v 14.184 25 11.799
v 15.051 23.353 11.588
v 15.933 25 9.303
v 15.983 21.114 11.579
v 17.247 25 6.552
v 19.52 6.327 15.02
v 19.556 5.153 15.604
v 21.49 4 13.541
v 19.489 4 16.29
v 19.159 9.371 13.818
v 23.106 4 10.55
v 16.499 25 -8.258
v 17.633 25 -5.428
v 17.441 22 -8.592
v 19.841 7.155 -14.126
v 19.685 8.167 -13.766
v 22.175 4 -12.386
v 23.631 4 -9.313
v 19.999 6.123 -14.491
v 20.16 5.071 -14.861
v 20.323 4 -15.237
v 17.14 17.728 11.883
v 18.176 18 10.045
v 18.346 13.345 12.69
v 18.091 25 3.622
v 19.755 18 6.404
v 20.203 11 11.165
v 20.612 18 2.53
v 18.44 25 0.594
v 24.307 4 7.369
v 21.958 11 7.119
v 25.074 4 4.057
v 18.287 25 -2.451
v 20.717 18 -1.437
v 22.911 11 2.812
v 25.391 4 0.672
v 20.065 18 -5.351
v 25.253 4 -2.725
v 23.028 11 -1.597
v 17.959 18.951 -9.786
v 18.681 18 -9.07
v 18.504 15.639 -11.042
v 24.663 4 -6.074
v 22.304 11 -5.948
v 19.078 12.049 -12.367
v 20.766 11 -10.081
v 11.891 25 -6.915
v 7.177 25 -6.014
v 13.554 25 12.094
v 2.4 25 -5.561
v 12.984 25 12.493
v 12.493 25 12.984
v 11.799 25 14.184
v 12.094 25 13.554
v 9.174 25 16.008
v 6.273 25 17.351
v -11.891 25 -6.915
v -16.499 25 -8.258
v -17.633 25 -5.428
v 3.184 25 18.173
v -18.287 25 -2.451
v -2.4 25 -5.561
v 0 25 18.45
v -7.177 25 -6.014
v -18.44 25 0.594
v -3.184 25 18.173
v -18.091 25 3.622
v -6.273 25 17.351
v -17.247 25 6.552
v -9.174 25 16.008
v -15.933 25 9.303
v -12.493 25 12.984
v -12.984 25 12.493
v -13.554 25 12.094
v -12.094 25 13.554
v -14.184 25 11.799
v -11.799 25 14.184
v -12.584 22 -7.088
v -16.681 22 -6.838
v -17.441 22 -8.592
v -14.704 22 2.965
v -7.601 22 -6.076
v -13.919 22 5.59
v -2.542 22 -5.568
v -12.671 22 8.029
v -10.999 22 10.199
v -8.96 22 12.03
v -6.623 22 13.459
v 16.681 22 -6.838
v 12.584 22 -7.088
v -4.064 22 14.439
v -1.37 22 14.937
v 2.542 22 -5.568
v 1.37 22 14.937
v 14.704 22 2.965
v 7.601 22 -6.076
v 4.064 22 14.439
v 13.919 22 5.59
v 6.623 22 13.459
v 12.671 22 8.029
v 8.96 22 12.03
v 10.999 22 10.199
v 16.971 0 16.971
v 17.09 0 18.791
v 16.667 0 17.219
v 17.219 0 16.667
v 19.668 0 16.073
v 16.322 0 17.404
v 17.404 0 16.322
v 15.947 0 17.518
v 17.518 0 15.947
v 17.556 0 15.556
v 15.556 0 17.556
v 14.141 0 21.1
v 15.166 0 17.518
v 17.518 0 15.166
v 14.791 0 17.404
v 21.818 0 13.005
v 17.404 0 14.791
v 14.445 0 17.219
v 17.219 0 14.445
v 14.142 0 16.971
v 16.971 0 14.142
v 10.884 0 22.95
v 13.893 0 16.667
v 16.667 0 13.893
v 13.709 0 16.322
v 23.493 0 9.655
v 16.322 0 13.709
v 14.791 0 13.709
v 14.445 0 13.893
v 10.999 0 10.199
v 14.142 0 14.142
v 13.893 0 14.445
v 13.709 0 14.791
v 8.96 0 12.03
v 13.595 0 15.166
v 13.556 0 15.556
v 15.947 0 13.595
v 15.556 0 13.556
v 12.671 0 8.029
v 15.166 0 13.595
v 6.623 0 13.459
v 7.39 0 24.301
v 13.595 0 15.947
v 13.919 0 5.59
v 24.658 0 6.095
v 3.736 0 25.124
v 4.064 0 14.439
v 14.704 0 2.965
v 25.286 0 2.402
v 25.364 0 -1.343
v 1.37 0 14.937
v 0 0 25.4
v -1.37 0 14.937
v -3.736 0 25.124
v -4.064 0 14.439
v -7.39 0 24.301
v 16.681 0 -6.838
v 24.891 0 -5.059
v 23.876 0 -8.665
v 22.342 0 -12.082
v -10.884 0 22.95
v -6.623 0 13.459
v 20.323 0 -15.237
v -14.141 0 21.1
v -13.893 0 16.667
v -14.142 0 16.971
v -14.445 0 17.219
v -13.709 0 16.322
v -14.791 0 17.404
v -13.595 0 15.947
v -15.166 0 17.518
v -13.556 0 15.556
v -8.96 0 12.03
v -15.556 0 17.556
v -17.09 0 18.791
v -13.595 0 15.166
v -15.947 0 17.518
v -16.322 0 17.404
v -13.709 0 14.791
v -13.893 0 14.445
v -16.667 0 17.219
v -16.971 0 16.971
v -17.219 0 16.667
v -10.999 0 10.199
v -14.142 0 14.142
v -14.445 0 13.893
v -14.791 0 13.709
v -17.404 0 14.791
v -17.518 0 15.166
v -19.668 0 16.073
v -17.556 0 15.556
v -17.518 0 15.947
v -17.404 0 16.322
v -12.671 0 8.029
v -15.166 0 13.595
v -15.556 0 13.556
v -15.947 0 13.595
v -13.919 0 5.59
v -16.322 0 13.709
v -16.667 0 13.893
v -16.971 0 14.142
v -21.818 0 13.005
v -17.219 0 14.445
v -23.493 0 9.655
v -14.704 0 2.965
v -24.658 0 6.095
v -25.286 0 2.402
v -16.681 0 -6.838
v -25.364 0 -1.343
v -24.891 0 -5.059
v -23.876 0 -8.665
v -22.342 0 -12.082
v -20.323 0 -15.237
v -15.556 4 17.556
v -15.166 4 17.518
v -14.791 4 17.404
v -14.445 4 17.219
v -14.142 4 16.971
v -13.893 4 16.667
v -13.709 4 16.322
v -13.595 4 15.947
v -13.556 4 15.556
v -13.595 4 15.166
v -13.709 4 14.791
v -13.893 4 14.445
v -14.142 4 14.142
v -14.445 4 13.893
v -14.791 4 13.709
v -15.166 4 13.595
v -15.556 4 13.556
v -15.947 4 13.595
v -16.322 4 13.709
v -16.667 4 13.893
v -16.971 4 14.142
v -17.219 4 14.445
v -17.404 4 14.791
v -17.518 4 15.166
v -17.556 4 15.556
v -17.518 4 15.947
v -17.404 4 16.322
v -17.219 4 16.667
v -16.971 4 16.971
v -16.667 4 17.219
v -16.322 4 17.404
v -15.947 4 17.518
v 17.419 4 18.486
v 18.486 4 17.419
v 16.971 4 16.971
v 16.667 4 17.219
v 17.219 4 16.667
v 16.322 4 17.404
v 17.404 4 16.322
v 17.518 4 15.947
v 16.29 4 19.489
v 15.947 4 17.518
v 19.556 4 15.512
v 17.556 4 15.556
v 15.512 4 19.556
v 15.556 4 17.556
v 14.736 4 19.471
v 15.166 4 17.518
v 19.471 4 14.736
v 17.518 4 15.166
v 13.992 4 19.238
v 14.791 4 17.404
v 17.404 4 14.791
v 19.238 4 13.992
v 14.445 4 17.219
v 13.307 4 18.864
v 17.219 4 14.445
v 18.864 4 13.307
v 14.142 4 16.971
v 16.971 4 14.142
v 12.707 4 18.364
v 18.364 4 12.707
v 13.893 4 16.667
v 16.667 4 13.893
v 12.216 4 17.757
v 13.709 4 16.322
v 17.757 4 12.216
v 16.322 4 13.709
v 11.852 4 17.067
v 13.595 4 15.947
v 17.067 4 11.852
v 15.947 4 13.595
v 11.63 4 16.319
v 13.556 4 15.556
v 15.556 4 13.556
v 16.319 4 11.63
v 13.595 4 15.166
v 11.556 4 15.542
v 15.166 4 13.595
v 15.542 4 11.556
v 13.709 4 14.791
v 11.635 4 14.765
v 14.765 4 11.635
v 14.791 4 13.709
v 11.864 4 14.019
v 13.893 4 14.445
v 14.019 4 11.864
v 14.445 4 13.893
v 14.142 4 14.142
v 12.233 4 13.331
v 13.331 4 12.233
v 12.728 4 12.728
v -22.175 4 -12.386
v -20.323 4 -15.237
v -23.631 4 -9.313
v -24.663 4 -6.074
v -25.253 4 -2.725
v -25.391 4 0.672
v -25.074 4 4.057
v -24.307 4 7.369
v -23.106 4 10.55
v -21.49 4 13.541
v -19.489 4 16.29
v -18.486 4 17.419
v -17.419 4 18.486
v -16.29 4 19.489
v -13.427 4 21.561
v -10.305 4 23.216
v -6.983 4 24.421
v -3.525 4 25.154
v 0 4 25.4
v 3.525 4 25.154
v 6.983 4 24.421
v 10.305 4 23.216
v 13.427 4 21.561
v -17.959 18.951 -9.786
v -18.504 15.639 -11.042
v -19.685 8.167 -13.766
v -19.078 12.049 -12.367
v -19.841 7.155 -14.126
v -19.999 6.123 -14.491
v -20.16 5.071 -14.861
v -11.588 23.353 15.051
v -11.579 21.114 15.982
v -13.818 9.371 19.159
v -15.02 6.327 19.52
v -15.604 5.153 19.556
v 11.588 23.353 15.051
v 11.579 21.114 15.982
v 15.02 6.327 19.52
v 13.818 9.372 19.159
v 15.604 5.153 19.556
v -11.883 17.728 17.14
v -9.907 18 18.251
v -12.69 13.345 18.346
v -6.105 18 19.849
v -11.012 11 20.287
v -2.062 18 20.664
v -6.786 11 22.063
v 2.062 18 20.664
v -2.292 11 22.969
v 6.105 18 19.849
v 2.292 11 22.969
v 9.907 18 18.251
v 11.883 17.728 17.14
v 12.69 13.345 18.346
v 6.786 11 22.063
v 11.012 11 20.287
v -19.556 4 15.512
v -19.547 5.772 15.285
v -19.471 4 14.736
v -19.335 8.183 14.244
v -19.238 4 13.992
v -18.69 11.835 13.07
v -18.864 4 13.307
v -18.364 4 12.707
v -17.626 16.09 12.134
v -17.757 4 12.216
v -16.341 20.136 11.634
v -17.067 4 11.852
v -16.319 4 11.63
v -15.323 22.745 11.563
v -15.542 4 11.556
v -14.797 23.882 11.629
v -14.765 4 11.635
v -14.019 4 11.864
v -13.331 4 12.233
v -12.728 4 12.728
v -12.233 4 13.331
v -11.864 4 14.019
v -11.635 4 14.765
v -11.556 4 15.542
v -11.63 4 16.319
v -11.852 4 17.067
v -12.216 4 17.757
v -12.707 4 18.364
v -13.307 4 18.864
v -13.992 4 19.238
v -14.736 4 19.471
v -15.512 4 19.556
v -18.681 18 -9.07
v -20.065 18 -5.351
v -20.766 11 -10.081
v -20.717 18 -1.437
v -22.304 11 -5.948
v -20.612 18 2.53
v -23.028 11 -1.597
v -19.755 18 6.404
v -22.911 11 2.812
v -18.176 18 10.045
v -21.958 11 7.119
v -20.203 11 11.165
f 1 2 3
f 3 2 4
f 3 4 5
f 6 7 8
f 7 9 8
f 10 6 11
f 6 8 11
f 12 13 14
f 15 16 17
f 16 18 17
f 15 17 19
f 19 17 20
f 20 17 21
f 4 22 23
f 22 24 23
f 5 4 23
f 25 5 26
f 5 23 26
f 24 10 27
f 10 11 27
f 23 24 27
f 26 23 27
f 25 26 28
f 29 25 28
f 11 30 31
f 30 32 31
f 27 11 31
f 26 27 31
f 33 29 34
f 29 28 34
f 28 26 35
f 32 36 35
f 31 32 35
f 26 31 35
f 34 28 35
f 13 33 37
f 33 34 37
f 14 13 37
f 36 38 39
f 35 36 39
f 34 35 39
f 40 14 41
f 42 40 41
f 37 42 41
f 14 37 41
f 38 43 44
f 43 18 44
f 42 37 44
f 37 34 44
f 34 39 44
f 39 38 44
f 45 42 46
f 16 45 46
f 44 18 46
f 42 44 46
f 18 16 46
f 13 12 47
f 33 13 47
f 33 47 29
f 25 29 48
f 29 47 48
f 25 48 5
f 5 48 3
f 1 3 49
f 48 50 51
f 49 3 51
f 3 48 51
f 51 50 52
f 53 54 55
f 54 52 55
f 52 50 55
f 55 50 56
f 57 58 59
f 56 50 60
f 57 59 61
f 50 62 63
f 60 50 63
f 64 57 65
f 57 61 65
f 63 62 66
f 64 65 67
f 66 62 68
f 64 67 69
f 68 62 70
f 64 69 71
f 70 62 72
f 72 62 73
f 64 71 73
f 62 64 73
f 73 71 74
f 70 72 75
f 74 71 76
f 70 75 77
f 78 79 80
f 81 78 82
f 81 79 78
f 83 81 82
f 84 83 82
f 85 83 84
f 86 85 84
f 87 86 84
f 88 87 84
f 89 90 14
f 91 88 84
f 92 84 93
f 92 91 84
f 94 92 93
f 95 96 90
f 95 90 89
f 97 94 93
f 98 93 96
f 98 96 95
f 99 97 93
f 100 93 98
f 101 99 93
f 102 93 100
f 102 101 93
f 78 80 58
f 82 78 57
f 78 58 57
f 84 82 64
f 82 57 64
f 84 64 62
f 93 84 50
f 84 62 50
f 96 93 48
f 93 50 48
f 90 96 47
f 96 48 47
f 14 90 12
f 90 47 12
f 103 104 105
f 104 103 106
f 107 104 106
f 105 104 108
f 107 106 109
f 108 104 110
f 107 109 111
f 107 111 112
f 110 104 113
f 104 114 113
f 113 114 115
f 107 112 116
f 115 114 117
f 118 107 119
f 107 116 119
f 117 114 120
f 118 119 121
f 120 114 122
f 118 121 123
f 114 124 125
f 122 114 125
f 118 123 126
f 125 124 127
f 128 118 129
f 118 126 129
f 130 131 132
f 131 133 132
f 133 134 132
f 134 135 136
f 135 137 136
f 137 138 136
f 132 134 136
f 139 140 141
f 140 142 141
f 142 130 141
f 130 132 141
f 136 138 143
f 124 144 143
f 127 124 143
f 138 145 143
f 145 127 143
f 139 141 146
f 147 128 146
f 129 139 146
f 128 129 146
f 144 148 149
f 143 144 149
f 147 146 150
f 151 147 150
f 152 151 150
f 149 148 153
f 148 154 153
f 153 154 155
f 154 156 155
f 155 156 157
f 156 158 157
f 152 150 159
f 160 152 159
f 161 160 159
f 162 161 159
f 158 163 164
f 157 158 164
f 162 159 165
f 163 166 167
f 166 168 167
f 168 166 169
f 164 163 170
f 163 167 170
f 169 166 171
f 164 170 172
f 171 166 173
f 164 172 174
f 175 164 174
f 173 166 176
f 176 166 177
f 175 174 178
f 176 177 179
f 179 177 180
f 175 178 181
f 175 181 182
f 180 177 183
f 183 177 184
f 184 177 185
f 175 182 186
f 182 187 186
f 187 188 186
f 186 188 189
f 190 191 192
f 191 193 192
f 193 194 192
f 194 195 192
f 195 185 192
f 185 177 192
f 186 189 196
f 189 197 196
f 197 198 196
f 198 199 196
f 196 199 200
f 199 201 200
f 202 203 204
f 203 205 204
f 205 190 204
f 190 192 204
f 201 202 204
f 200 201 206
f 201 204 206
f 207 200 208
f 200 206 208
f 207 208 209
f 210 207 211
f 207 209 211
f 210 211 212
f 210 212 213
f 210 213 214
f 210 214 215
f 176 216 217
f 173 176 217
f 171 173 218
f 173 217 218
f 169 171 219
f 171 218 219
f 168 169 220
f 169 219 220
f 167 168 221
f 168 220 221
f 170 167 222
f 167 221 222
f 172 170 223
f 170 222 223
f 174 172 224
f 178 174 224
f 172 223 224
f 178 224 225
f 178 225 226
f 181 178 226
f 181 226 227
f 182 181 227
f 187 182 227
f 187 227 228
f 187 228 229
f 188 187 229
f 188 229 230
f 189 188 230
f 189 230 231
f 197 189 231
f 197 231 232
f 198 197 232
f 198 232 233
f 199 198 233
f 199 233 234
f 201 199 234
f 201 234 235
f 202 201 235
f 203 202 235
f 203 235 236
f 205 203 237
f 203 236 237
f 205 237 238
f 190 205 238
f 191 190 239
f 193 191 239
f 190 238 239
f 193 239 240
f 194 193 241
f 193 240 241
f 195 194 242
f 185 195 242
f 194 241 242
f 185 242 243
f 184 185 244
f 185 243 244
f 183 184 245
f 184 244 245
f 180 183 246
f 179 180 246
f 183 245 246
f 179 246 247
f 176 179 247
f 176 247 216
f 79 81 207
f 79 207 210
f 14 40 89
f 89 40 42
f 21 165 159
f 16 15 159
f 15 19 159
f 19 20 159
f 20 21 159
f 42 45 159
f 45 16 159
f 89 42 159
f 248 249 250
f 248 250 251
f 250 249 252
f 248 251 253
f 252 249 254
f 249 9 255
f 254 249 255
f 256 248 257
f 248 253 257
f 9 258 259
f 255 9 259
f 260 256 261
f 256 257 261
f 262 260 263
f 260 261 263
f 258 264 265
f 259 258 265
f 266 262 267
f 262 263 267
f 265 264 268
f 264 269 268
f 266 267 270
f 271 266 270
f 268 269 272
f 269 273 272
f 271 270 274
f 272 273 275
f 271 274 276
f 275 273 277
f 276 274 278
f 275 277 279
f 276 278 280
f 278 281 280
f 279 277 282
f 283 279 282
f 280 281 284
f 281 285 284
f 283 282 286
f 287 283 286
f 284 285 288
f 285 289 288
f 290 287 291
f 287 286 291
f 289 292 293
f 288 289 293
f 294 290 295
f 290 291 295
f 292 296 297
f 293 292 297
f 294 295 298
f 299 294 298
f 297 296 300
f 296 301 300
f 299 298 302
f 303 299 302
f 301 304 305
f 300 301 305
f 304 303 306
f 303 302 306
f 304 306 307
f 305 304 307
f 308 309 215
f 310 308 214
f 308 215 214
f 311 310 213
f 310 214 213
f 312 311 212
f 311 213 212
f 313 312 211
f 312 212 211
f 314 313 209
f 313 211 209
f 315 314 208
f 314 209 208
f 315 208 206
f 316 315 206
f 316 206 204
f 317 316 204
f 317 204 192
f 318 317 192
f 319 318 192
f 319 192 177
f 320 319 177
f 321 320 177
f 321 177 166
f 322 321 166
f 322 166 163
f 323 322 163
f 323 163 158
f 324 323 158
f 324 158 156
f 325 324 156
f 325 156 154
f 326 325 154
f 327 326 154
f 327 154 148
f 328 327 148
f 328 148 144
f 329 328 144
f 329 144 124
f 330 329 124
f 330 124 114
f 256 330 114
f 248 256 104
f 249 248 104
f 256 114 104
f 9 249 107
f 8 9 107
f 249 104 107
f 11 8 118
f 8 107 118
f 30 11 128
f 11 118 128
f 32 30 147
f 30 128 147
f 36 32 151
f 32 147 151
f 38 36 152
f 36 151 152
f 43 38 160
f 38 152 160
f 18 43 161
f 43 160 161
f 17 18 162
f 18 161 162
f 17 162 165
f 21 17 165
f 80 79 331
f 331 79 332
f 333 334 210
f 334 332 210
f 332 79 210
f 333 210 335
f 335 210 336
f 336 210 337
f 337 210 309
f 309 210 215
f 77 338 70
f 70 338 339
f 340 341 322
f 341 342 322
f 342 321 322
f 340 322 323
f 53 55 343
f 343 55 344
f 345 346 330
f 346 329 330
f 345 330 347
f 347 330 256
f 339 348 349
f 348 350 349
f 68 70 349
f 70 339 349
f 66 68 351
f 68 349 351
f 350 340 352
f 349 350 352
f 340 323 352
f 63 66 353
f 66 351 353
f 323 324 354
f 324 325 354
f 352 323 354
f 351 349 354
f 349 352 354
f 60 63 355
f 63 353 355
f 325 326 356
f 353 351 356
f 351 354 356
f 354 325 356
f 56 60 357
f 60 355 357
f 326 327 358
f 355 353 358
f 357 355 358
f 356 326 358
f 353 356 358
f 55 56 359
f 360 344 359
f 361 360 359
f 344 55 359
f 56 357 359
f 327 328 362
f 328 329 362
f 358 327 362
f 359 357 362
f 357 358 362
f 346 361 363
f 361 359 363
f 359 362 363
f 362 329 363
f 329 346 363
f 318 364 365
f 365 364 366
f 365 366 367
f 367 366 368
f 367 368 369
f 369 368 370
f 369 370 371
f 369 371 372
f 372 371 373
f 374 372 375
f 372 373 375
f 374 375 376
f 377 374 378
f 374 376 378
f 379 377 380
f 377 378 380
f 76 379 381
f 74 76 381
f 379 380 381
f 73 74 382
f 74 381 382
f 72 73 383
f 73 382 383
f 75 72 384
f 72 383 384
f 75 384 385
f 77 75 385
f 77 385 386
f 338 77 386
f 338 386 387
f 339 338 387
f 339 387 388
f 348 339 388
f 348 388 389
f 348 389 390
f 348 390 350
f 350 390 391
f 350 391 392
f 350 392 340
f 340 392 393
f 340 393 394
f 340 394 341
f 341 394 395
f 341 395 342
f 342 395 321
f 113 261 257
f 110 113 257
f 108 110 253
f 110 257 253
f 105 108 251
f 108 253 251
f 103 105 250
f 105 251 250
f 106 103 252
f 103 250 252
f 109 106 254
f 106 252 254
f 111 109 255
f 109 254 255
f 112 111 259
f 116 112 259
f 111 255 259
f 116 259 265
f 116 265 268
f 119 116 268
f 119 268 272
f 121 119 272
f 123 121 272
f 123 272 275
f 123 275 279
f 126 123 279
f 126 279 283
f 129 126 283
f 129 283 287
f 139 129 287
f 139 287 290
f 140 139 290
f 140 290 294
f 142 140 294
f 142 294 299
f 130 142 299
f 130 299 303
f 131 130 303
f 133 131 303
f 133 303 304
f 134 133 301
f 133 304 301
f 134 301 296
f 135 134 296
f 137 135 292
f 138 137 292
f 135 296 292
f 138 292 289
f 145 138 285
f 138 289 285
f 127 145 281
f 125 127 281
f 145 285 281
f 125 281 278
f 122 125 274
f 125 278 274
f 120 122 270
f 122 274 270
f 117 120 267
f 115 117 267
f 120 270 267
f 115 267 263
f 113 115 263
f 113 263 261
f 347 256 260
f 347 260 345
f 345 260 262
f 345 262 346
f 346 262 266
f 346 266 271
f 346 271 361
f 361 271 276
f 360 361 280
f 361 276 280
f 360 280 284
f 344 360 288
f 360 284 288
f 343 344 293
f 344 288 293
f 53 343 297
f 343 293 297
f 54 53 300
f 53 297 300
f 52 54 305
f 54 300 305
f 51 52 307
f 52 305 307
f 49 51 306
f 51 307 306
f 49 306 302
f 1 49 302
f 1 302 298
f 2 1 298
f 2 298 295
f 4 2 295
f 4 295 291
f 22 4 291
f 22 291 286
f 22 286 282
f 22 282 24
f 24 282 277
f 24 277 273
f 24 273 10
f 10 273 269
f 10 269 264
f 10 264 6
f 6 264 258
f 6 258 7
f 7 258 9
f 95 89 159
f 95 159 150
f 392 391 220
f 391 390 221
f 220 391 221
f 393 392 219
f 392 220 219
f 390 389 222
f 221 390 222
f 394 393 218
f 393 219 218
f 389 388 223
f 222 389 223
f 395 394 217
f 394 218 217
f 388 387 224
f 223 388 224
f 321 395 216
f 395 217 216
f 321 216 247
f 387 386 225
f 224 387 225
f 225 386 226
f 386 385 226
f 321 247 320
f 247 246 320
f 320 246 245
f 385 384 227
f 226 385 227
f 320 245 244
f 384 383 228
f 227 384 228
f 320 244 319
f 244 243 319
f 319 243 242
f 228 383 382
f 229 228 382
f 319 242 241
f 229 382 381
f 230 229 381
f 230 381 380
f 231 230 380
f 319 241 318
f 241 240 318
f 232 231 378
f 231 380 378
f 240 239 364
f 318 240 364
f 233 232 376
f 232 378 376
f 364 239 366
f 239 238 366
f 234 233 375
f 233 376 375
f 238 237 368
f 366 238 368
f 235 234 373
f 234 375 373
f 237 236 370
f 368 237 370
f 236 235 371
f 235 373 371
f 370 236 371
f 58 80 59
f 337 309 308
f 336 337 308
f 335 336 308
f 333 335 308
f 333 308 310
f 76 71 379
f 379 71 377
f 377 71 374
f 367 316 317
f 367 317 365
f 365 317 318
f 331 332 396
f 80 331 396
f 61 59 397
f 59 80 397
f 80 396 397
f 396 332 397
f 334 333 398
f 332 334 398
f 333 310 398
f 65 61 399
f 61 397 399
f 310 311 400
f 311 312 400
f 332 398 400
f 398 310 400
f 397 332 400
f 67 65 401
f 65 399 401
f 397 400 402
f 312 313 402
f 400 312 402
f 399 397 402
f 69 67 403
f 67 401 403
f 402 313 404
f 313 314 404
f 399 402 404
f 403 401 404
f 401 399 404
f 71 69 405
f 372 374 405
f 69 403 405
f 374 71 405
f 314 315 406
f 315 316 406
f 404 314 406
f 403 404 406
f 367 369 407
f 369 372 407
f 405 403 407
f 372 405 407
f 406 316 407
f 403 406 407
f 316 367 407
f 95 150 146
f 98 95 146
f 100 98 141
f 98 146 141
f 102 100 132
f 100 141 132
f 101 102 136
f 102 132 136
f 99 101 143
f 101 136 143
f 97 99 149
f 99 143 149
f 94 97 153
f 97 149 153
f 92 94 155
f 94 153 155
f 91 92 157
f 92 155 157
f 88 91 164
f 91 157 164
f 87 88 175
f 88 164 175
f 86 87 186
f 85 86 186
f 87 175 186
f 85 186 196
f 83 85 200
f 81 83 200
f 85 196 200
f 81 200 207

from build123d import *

# Parameters (mm, degrees)
SKETCH5_R          = 2
CUT_EXTRUDE2_DEPTH = 44.764369069
SKETCH6_R          = 4
CUT_EXTRUDE3_DEPTH = 22
SKETCH7_R          = 4.5
CUT_EXTRUDE4_DEPTH = 22
CUT_EXTRUDE5_DEPTH = 22
CUT_EXTRUDE6_DEPTH = 44.764369185


with BuildPart() as part:
    # Sketch2 → Revolve1 (revolve)
    with BuildSketch(Plane(origin=(0, 0, 0), x_dir=(0, 0, -1), z_dir=(1, 0, 0))):
        Polygon((-18.45, 25), (-25.4, 4), (-25.4, 0), (-15, 0), (-15, 22), (0, 22), (0, 25), align=None)
    revolve(axis=Axis((0, 0, 0), (0, 1, 0)))

    # Sketch5 → Cut-Extrude2 (cut, through all)
    with BuildSketch(Plane(origin=(0, 25, 0), x_dir=(1, 0, 0), z_dir=(0, 1, 0))):
        with Locations((-15.556349186, -15.556349186)):
            Circle(SKETCH5_R)
        with Locations((15.556349186, -15.556349186)):
            Circle(SKETCH5_R)
    extrude(amount=-CUT_EXTRUDE2_DEPTH, mode=Mode.SUBTRACT)

    # Sketch6 → Cut-Extrude3 (cut)
    with BuildSketch(Plane(origin=(0, 4, 0), x_dir=(-1, 0, 0), z_dir=(0, -1, 0))):
        with Locations((15.556349186, -15.556349186)):
            Circle(SKETCH6_R)
        with Locations((-15.556349186, -15.556349186)):
            Circle(SKETCH6_R)
    extrude(amount=-CUT_EXTRUDE3_DEPTH, mode=Mode.SUBTRACT)

    # Sketch7 → Cut-Extrude4 (cut)
    with BuildSketch(Plane(origin=(0, 0, 0), x_dir=(-1, 0, 0), z_dir=(0, -1, 0))):
        with Locations((15.556349186, 15.556349186)):
            Circle(SKETCH7_R)
        with Locations((-15.556349186, 15.556349186)):
            Circle(SKETCH7_R)
    extrude(amount=-CUT_EXTRUDE4_DEPTH, mode=Mode.SUBTRACT)

    # Sketch10 → Cut-Extrude5 (cut)
    with BuildSketch(Plane.XZ):
        with BuildLine():
            Line((-14.704067619, 2.964860106), (-16.680641023, -6.837851641))
            Line((-16.680641023, -6.837851641), (-20.322553732, -15.236594429))
            ThreePointArc((-20.322553732, -15.236594429), (-17.924840594, -17.996113183), (-15.155828757, -20.382856883))
            ThreePointArc((-15.155828757, -20.382856883), (0, -25.4), (15.155828757, -20.382856883))
            ThreePointArc((15.155828757, -20.382856883), (17.924840594, -17.996113183), (20.322553732, -15.236594429))
            Line((20.322553732, -15.236594429), (16.680641023, -6.837851641))
            Line((16.680641023, -6.837851641), (14.704067619, 2.964860106))
            ThreePointArc((14.704067619, 2.964860106), (0, 15), (-14.704067619, 2.964860106))
        make_face()
    extrude(amount=-CUT_EXTRUDE5_DEPTH, mode=Mode.SUBTRACT)

    # Sketch14 → Cut-Extrude6 (cut, through all)
    with BuildSketch(Plane(origin=(0, 25, 0), x_dir=(1, 0, 0), z_dir=(0, 1, 0))):
        with BuildLine():
            ThreePointArc((17.441336231, 8.592117572), (0, 19.442857143), (-17.441336231, 8.592117572))
            ThreePointArc((-17.441336231, 8.592117572), (0, 5.504168361), (17.441336231, 8.592117572))
        make_face()
    extrude(amount=-CUT_EXTRUDE6_DEPTH, mode=Mode.SUBTRACT)


solid = part.part
